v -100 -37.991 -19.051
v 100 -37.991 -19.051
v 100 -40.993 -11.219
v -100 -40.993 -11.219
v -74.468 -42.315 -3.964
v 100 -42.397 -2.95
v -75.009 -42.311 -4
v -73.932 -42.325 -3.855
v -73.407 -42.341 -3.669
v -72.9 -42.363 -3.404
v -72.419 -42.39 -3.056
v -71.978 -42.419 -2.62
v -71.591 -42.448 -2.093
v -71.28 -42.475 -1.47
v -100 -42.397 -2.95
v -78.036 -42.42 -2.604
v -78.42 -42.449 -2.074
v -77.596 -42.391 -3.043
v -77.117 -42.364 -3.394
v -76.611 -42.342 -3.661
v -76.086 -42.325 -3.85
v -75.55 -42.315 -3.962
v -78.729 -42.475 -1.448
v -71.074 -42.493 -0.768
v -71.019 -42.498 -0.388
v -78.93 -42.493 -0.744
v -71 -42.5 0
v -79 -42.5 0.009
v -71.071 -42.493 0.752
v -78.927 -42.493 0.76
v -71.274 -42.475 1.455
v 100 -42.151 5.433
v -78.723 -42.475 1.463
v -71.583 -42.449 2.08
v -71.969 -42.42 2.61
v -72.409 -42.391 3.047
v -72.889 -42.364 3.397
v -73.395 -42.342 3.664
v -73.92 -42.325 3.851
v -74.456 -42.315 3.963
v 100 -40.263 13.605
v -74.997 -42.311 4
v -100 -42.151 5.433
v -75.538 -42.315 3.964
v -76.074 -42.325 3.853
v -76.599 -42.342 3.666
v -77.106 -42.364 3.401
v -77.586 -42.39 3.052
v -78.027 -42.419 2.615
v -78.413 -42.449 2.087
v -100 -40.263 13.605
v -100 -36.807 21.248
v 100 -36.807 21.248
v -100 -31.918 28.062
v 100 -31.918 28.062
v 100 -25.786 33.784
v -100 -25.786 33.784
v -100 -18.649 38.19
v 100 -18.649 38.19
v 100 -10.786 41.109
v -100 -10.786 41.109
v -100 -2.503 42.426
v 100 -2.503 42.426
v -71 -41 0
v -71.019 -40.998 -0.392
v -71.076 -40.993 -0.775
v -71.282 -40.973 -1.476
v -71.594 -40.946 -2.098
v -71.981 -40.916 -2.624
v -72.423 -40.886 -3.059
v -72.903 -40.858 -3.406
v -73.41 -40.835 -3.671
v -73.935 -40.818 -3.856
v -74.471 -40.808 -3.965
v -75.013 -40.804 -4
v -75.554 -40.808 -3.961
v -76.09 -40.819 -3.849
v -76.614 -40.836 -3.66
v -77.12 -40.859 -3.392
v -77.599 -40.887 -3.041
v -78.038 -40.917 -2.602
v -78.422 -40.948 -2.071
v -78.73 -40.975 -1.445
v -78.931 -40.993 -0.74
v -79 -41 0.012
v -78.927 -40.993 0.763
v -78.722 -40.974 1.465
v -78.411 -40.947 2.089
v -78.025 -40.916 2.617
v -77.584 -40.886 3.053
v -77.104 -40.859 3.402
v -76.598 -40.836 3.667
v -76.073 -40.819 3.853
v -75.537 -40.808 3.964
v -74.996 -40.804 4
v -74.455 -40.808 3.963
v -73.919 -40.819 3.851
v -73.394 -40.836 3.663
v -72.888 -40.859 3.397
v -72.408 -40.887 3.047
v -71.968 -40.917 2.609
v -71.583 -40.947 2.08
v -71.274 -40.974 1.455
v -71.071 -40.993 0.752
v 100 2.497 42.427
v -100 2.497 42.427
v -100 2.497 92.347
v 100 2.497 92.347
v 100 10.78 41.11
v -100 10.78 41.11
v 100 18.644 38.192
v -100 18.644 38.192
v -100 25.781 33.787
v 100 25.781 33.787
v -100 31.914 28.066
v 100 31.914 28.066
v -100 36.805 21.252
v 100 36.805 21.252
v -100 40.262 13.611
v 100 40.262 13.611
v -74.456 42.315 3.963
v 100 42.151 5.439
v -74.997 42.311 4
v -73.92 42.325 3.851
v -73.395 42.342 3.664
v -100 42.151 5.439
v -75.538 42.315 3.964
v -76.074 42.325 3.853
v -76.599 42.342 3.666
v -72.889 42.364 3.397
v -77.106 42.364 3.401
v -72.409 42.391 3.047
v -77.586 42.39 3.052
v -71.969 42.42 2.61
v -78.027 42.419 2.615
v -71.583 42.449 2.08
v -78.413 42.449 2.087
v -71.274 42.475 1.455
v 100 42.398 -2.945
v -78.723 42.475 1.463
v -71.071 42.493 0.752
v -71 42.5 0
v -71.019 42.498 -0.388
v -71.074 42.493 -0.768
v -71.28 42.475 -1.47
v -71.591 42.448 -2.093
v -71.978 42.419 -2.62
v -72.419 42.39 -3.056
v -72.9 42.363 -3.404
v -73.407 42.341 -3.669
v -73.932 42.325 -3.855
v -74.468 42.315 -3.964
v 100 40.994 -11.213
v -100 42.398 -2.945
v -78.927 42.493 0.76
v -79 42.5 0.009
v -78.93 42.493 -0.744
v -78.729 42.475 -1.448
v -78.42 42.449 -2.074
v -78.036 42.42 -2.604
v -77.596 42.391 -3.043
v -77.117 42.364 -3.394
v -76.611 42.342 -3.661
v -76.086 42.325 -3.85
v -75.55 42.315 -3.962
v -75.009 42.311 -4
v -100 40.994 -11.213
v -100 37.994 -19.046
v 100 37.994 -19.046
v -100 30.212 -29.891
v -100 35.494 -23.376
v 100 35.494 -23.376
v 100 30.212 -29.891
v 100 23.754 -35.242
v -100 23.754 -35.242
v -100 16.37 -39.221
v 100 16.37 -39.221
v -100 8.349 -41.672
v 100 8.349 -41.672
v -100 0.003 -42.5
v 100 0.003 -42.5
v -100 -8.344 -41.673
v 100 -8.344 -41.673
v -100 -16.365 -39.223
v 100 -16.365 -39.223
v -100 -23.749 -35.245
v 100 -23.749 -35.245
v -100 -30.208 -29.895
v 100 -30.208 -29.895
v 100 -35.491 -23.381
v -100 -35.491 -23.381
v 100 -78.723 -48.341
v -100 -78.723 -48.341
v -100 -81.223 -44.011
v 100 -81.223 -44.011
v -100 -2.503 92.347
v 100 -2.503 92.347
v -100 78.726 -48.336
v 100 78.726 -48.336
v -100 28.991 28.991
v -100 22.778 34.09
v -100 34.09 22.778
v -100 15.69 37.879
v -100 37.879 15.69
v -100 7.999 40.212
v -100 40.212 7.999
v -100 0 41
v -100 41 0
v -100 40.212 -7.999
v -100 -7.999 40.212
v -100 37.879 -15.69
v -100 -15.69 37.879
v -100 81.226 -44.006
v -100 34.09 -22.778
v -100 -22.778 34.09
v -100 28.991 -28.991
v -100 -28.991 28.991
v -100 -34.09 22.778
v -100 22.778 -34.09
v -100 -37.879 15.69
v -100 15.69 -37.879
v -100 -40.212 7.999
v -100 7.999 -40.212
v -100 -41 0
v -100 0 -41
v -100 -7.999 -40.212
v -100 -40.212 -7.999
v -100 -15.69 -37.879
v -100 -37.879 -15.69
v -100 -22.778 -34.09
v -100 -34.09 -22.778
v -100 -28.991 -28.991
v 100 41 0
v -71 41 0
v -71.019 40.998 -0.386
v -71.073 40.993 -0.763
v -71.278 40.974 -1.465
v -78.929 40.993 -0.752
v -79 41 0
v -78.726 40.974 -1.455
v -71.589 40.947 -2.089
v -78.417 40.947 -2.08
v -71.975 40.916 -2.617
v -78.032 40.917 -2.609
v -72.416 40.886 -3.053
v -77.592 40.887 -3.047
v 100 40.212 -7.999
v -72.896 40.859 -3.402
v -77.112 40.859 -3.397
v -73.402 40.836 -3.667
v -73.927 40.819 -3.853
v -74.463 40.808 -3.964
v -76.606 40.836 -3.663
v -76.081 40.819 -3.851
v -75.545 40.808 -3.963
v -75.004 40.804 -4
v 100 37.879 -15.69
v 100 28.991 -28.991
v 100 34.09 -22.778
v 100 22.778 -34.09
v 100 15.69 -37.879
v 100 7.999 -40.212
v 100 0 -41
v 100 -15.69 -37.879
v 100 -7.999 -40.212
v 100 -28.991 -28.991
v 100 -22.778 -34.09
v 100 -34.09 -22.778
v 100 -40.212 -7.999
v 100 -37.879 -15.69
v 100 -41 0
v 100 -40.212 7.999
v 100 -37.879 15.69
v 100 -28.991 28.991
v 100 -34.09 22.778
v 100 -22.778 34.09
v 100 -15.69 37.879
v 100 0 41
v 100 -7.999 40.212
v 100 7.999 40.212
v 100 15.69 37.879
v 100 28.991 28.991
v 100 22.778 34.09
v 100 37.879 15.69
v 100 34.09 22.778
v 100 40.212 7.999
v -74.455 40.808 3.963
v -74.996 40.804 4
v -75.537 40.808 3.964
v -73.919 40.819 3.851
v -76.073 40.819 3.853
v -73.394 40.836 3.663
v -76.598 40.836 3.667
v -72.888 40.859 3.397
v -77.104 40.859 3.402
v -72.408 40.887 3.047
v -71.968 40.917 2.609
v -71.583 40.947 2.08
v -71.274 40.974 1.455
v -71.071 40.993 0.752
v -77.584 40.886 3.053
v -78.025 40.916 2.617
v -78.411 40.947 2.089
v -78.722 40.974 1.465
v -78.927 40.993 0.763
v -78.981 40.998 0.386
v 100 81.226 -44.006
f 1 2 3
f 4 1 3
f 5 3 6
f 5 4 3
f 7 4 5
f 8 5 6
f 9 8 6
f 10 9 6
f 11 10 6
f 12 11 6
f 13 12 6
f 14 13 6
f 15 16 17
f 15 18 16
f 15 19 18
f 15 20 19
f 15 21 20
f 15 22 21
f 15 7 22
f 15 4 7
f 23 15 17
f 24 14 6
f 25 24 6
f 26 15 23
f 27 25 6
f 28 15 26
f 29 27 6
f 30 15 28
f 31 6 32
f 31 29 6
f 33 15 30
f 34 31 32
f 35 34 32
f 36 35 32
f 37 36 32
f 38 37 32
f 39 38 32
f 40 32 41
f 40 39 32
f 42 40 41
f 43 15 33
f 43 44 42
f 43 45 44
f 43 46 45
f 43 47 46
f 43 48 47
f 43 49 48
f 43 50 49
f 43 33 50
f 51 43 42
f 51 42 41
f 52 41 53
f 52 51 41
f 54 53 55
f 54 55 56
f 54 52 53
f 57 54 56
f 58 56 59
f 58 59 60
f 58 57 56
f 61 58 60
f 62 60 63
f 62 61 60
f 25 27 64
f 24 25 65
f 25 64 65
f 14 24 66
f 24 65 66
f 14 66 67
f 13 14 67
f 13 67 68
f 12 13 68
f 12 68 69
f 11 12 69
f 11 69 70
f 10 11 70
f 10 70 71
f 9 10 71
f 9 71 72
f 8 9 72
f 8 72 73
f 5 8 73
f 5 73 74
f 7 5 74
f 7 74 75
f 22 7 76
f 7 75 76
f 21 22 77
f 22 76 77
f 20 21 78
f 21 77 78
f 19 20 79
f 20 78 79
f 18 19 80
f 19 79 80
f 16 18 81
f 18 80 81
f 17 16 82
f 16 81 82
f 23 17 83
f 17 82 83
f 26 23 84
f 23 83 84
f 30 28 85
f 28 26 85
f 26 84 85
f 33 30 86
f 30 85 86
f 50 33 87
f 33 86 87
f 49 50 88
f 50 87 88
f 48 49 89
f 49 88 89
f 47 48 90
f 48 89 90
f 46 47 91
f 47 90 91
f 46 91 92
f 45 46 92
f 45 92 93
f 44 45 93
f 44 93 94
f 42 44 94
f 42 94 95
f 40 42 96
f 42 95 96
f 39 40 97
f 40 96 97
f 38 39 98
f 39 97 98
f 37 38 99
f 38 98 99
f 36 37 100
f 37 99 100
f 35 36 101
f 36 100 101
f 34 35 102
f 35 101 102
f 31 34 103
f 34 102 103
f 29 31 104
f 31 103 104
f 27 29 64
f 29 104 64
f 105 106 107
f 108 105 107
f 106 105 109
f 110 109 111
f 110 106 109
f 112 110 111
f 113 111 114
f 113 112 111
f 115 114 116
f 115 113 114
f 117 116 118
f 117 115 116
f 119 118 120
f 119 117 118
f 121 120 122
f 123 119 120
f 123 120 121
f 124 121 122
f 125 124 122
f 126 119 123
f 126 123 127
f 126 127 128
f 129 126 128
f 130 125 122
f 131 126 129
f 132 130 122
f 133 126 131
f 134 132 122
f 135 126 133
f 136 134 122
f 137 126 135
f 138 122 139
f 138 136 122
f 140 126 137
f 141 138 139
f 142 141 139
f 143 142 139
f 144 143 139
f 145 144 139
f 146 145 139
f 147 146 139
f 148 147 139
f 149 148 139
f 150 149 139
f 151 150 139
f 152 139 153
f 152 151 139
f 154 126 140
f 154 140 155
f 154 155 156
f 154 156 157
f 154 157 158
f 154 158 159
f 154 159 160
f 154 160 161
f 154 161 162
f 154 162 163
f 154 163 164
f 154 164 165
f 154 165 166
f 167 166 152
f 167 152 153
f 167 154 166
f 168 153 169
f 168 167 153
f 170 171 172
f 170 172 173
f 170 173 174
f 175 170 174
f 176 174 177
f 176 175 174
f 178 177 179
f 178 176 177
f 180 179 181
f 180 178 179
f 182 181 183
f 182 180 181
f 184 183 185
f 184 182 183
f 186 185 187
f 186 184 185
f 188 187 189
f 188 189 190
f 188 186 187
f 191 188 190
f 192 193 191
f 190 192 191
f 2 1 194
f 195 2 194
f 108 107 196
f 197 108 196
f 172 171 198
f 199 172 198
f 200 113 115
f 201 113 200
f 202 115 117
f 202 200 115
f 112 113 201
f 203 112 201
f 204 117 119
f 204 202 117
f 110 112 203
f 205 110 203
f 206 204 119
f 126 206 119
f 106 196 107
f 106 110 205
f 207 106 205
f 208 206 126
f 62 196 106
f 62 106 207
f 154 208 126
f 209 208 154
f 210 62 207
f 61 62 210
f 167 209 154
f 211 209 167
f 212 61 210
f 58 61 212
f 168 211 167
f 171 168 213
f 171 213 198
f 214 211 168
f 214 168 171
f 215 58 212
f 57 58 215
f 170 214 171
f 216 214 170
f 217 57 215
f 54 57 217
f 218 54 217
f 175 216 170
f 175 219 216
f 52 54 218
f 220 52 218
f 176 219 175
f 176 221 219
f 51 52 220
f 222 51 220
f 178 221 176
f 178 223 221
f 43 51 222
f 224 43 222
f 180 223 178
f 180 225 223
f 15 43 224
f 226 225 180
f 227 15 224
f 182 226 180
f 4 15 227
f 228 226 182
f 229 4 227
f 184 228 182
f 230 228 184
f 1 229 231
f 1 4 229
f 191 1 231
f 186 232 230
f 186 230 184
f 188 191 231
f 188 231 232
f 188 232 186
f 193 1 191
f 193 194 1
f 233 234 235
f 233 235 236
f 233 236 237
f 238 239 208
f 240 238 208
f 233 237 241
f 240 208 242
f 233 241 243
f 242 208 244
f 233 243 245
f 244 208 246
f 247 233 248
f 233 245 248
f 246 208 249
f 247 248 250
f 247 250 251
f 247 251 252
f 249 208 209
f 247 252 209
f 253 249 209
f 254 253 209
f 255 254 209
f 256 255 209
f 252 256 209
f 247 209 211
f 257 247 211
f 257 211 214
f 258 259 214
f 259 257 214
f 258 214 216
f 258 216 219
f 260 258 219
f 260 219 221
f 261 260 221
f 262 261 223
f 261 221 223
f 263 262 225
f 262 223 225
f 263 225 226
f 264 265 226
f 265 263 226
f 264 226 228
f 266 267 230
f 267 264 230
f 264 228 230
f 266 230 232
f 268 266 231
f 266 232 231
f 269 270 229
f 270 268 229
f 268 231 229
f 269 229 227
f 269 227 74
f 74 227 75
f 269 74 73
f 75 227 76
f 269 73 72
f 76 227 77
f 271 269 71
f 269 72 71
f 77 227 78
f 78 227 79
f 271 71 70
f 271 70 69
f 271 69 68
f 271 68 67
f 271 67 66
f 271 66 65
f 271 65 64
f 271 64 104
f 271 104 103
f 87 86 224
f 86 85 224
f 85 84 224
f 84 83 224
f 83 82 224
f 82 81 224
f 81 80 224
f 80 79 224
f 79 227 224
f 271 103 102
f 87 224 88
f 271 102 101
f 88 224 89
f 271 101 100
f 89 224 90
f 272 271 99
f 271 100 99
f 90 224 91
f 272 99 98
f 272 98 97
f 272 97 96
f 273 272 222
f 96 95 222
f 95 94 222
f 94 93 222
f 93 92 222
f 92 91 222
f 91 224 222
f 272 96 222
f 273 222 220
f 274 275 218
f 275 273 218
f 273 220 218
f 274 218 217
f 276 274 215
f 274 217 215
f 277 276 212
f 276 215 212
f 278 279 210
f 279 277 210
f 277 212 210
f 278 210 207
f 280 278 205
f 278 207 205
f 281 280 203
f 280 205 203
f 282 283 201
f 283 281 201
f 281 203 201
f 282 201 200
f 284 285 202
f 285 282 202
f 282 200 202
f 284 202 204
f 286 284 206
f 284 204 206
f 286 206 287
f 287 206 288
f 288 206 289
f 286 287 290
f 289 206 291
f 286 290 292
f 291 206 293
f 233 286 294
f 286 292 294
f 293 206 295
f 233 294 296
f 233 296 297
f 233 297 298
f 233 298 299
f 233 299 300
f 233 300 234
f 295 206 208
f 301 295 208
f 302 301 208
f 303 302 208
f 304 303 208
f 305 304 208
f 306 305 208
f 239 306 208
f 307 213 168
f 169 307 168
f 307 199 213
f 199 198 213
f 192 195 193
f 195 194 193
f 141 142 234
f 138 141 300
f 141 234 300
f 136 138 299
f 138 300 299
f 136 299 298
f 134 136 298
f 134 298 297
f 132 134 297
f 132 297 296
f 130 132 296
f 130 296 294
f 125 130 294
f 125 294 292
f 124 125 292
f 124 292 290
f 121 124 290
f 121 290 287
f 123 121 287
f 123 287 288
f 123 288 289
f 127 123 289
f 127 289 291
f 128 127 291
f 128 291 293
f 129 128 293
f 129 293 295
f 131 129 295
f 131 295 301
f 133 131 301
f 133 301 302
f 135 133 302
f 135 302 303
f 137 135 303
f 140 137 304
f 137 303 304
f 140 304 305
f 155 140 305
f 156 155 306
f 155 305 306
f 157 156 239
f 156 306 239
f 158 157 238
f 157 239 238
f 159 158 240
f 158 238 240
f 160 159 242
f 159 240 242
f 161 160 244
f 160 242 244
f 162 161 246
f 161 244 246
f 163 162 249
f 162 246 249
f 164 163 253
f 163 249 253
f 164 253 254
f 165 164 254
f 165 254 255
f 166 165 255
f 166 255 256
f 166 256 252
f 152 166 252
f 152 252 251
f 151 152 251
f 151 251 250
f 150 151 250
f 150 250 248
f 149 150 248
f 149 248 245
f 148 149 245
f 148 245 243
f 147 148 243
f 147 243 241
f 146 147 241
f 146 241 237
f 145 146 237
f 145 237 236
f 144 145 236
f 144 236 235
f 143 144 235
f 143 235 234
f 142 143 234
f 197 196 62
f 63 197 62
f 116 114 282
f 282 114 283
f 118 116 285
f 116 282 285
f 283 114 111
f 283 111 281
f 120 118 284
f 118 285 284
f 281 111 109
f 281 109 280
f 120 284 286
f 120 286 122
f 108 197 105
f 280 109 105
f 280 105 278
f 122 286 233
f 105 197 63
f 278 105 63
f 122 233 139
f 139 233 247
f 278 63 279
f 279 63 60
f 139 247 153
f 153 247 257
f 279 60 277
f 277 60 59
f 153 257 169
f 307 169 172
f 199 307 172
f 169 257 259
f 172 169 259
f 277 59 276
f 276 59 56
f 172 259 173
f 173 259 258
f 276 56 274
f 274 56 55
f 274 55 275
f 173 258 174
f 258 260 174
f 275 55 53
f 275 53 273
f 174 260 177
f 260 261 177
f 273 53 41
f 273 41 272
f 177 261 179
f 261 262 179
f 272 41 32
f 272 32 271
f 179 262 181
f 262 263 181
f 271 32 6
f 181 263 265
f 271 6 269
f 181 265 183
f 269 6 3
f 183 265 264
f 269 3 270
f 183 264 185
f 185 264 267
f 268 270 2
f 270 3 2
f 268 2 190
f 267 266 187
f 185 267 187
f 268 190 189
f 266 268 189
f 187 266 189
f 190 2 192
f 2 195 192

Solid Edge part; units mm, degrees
sketch "Sketch1" plane through (0, 0, 0) normal (1, 0, 0) x (0, 1, 0)
  arc A0 (2.4972, 42.4266) -> (37.9936, -19.0456) centre (0, 0) cw
  line L0 (81.226, -44.0058) -> (37.9936, -19.0456)
  line L1 (78.726, -48.336) -> (81.226, -44.0058)
  line L2 (35.4939, -23.3759) -> (78.726, -48.336)
  line L3 (-78.7232, -48.3409) -> (-35.4908, -23.3806)
  line L4 (-81.2232, -44.0107) -> (-78.7232, -48.3409)
  line L5 (-37.9911, -19.0507) -> (-81.2232, -44.0107)
  arc A1 (-37.9911, -19.0507) -> (-2.5028, 42.4262) centre (0, 0) cw
  line L6 (-2.5028, 92.3467) -> (-2.5028, 42.4262)
  line L7 (2.4972, 92.3467) -> (-2.5028, 92.3467)
  line L8 (2.4972, 42.4266) -> (2.4972, 92.3467)
  arc A2 (35.4939, -23.3759) -> (-35.4908, -23.3806) centre (0, 0) cw
extrude "Protrusion1" add sketch "Sketch1" along normal mid plane 200
sketch "Sketch2" plane through (0, 0, 0) normal (1, 0, 0) x (0, 1, 0)
  circle A0 centre (0, 0) radius 41
extrude "ExtrudedCutout_5" cut sketch "Sketch2" along normal mid plane 200
sketch "Sketch3" plane through (0, 0, 0) normal (0, -1, 0) x (1, 0, 0)
  circle A0 centre (-75, 0) radius 4
extrude "ExtrudedProtrusion_6" cut sketch "Sketch3" along normal mid plane 90
